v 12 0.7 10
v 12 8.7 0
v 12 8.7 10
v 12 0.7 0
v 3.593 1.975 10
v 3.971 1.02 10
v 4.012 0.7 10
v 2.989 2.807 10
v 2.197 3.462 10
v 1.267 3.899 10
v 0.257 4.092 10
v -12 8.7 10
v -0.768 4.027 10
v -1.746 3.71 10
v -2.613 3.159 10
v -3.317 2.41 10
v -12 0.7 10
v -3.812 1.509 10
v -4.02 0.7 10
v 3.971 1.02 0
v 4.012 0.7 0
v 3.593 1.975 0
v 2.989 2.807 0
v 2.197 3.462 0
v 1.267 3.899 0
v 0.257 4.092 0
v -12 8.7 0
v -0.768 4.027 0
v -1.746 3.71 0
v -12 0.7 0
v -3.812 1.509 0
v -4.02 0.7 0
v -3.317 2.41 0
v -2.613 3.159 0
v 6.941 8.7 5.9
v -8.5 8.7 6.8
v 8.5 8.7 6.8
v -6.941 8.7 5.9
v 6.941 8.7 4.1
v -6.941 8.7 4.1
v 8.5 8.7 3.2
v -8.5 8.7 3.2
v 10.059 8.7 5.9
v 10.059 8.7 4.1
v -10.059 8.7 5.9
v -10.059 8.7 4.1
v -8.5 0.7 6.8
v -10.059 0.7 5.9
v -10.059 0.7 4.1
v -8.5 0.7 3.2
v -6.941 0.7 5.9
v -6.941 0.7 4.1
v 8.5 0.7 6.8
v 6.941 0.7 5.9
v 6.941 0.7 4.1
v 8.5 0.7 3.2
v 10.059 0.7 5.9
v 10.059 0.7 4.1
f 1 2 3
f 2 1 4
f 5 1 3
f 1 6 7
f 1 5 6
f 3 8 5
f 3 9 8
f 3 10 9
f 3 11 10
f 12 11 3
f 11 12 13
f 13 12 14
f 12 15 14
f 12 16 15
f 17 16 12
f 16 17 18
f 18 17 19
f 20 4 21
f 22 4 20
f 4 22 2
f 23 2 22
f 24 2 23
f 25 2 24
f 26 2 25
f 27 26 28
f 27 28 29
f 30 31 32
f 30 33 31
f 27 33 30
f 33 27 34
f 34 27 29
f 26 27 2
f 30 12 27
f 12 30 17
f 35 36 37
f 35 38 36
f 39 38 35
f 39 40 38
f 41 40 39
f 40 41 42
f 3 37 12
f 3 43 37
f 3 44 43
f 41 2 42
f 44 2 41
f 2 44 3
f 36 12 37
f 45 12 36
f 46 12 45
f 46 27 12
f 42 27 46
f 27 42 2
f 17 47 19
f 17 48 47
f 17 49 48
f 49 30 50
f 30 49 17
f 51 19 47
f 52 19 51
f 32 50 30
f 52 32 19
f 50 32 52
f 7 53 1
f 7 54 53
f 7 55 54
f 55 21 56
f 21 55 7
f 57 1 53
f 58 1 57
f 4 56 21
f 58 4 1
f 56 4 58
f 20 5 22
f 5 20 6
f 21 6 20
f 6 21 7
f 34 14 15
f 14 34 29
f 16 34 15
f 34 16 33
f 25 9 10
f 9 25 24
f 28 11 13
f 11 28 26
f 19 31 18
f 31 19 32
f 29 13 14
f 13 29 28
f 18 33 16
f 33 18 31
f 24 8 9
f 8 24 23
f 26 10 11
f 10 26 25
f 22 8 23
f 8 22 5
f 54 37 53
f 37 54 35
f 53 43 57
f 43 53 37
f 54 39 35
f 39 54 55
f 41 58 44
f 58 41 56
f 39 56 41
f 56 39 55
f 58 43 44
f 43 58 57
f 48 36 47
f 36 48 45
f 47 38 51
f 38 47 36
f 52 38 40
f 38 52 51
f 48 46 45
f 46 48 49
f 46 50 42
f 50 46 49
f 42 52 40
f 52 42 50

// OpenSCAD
difference(){
translate([-12,0.7,0])cube([24,8,10]);
translate([0,0,-1]) cylinder(r=4.1, h=20, $fn=25);
translate([8.5,10,5]) rotate([90,0,0]) rotate([0,0,30])  cylinder(r=1.8, h=20);
translate([-8.5,10,5]) rotate([90,0,0]) rotate([0,0,30])  cylinder(r=1.8, h=20);
}
